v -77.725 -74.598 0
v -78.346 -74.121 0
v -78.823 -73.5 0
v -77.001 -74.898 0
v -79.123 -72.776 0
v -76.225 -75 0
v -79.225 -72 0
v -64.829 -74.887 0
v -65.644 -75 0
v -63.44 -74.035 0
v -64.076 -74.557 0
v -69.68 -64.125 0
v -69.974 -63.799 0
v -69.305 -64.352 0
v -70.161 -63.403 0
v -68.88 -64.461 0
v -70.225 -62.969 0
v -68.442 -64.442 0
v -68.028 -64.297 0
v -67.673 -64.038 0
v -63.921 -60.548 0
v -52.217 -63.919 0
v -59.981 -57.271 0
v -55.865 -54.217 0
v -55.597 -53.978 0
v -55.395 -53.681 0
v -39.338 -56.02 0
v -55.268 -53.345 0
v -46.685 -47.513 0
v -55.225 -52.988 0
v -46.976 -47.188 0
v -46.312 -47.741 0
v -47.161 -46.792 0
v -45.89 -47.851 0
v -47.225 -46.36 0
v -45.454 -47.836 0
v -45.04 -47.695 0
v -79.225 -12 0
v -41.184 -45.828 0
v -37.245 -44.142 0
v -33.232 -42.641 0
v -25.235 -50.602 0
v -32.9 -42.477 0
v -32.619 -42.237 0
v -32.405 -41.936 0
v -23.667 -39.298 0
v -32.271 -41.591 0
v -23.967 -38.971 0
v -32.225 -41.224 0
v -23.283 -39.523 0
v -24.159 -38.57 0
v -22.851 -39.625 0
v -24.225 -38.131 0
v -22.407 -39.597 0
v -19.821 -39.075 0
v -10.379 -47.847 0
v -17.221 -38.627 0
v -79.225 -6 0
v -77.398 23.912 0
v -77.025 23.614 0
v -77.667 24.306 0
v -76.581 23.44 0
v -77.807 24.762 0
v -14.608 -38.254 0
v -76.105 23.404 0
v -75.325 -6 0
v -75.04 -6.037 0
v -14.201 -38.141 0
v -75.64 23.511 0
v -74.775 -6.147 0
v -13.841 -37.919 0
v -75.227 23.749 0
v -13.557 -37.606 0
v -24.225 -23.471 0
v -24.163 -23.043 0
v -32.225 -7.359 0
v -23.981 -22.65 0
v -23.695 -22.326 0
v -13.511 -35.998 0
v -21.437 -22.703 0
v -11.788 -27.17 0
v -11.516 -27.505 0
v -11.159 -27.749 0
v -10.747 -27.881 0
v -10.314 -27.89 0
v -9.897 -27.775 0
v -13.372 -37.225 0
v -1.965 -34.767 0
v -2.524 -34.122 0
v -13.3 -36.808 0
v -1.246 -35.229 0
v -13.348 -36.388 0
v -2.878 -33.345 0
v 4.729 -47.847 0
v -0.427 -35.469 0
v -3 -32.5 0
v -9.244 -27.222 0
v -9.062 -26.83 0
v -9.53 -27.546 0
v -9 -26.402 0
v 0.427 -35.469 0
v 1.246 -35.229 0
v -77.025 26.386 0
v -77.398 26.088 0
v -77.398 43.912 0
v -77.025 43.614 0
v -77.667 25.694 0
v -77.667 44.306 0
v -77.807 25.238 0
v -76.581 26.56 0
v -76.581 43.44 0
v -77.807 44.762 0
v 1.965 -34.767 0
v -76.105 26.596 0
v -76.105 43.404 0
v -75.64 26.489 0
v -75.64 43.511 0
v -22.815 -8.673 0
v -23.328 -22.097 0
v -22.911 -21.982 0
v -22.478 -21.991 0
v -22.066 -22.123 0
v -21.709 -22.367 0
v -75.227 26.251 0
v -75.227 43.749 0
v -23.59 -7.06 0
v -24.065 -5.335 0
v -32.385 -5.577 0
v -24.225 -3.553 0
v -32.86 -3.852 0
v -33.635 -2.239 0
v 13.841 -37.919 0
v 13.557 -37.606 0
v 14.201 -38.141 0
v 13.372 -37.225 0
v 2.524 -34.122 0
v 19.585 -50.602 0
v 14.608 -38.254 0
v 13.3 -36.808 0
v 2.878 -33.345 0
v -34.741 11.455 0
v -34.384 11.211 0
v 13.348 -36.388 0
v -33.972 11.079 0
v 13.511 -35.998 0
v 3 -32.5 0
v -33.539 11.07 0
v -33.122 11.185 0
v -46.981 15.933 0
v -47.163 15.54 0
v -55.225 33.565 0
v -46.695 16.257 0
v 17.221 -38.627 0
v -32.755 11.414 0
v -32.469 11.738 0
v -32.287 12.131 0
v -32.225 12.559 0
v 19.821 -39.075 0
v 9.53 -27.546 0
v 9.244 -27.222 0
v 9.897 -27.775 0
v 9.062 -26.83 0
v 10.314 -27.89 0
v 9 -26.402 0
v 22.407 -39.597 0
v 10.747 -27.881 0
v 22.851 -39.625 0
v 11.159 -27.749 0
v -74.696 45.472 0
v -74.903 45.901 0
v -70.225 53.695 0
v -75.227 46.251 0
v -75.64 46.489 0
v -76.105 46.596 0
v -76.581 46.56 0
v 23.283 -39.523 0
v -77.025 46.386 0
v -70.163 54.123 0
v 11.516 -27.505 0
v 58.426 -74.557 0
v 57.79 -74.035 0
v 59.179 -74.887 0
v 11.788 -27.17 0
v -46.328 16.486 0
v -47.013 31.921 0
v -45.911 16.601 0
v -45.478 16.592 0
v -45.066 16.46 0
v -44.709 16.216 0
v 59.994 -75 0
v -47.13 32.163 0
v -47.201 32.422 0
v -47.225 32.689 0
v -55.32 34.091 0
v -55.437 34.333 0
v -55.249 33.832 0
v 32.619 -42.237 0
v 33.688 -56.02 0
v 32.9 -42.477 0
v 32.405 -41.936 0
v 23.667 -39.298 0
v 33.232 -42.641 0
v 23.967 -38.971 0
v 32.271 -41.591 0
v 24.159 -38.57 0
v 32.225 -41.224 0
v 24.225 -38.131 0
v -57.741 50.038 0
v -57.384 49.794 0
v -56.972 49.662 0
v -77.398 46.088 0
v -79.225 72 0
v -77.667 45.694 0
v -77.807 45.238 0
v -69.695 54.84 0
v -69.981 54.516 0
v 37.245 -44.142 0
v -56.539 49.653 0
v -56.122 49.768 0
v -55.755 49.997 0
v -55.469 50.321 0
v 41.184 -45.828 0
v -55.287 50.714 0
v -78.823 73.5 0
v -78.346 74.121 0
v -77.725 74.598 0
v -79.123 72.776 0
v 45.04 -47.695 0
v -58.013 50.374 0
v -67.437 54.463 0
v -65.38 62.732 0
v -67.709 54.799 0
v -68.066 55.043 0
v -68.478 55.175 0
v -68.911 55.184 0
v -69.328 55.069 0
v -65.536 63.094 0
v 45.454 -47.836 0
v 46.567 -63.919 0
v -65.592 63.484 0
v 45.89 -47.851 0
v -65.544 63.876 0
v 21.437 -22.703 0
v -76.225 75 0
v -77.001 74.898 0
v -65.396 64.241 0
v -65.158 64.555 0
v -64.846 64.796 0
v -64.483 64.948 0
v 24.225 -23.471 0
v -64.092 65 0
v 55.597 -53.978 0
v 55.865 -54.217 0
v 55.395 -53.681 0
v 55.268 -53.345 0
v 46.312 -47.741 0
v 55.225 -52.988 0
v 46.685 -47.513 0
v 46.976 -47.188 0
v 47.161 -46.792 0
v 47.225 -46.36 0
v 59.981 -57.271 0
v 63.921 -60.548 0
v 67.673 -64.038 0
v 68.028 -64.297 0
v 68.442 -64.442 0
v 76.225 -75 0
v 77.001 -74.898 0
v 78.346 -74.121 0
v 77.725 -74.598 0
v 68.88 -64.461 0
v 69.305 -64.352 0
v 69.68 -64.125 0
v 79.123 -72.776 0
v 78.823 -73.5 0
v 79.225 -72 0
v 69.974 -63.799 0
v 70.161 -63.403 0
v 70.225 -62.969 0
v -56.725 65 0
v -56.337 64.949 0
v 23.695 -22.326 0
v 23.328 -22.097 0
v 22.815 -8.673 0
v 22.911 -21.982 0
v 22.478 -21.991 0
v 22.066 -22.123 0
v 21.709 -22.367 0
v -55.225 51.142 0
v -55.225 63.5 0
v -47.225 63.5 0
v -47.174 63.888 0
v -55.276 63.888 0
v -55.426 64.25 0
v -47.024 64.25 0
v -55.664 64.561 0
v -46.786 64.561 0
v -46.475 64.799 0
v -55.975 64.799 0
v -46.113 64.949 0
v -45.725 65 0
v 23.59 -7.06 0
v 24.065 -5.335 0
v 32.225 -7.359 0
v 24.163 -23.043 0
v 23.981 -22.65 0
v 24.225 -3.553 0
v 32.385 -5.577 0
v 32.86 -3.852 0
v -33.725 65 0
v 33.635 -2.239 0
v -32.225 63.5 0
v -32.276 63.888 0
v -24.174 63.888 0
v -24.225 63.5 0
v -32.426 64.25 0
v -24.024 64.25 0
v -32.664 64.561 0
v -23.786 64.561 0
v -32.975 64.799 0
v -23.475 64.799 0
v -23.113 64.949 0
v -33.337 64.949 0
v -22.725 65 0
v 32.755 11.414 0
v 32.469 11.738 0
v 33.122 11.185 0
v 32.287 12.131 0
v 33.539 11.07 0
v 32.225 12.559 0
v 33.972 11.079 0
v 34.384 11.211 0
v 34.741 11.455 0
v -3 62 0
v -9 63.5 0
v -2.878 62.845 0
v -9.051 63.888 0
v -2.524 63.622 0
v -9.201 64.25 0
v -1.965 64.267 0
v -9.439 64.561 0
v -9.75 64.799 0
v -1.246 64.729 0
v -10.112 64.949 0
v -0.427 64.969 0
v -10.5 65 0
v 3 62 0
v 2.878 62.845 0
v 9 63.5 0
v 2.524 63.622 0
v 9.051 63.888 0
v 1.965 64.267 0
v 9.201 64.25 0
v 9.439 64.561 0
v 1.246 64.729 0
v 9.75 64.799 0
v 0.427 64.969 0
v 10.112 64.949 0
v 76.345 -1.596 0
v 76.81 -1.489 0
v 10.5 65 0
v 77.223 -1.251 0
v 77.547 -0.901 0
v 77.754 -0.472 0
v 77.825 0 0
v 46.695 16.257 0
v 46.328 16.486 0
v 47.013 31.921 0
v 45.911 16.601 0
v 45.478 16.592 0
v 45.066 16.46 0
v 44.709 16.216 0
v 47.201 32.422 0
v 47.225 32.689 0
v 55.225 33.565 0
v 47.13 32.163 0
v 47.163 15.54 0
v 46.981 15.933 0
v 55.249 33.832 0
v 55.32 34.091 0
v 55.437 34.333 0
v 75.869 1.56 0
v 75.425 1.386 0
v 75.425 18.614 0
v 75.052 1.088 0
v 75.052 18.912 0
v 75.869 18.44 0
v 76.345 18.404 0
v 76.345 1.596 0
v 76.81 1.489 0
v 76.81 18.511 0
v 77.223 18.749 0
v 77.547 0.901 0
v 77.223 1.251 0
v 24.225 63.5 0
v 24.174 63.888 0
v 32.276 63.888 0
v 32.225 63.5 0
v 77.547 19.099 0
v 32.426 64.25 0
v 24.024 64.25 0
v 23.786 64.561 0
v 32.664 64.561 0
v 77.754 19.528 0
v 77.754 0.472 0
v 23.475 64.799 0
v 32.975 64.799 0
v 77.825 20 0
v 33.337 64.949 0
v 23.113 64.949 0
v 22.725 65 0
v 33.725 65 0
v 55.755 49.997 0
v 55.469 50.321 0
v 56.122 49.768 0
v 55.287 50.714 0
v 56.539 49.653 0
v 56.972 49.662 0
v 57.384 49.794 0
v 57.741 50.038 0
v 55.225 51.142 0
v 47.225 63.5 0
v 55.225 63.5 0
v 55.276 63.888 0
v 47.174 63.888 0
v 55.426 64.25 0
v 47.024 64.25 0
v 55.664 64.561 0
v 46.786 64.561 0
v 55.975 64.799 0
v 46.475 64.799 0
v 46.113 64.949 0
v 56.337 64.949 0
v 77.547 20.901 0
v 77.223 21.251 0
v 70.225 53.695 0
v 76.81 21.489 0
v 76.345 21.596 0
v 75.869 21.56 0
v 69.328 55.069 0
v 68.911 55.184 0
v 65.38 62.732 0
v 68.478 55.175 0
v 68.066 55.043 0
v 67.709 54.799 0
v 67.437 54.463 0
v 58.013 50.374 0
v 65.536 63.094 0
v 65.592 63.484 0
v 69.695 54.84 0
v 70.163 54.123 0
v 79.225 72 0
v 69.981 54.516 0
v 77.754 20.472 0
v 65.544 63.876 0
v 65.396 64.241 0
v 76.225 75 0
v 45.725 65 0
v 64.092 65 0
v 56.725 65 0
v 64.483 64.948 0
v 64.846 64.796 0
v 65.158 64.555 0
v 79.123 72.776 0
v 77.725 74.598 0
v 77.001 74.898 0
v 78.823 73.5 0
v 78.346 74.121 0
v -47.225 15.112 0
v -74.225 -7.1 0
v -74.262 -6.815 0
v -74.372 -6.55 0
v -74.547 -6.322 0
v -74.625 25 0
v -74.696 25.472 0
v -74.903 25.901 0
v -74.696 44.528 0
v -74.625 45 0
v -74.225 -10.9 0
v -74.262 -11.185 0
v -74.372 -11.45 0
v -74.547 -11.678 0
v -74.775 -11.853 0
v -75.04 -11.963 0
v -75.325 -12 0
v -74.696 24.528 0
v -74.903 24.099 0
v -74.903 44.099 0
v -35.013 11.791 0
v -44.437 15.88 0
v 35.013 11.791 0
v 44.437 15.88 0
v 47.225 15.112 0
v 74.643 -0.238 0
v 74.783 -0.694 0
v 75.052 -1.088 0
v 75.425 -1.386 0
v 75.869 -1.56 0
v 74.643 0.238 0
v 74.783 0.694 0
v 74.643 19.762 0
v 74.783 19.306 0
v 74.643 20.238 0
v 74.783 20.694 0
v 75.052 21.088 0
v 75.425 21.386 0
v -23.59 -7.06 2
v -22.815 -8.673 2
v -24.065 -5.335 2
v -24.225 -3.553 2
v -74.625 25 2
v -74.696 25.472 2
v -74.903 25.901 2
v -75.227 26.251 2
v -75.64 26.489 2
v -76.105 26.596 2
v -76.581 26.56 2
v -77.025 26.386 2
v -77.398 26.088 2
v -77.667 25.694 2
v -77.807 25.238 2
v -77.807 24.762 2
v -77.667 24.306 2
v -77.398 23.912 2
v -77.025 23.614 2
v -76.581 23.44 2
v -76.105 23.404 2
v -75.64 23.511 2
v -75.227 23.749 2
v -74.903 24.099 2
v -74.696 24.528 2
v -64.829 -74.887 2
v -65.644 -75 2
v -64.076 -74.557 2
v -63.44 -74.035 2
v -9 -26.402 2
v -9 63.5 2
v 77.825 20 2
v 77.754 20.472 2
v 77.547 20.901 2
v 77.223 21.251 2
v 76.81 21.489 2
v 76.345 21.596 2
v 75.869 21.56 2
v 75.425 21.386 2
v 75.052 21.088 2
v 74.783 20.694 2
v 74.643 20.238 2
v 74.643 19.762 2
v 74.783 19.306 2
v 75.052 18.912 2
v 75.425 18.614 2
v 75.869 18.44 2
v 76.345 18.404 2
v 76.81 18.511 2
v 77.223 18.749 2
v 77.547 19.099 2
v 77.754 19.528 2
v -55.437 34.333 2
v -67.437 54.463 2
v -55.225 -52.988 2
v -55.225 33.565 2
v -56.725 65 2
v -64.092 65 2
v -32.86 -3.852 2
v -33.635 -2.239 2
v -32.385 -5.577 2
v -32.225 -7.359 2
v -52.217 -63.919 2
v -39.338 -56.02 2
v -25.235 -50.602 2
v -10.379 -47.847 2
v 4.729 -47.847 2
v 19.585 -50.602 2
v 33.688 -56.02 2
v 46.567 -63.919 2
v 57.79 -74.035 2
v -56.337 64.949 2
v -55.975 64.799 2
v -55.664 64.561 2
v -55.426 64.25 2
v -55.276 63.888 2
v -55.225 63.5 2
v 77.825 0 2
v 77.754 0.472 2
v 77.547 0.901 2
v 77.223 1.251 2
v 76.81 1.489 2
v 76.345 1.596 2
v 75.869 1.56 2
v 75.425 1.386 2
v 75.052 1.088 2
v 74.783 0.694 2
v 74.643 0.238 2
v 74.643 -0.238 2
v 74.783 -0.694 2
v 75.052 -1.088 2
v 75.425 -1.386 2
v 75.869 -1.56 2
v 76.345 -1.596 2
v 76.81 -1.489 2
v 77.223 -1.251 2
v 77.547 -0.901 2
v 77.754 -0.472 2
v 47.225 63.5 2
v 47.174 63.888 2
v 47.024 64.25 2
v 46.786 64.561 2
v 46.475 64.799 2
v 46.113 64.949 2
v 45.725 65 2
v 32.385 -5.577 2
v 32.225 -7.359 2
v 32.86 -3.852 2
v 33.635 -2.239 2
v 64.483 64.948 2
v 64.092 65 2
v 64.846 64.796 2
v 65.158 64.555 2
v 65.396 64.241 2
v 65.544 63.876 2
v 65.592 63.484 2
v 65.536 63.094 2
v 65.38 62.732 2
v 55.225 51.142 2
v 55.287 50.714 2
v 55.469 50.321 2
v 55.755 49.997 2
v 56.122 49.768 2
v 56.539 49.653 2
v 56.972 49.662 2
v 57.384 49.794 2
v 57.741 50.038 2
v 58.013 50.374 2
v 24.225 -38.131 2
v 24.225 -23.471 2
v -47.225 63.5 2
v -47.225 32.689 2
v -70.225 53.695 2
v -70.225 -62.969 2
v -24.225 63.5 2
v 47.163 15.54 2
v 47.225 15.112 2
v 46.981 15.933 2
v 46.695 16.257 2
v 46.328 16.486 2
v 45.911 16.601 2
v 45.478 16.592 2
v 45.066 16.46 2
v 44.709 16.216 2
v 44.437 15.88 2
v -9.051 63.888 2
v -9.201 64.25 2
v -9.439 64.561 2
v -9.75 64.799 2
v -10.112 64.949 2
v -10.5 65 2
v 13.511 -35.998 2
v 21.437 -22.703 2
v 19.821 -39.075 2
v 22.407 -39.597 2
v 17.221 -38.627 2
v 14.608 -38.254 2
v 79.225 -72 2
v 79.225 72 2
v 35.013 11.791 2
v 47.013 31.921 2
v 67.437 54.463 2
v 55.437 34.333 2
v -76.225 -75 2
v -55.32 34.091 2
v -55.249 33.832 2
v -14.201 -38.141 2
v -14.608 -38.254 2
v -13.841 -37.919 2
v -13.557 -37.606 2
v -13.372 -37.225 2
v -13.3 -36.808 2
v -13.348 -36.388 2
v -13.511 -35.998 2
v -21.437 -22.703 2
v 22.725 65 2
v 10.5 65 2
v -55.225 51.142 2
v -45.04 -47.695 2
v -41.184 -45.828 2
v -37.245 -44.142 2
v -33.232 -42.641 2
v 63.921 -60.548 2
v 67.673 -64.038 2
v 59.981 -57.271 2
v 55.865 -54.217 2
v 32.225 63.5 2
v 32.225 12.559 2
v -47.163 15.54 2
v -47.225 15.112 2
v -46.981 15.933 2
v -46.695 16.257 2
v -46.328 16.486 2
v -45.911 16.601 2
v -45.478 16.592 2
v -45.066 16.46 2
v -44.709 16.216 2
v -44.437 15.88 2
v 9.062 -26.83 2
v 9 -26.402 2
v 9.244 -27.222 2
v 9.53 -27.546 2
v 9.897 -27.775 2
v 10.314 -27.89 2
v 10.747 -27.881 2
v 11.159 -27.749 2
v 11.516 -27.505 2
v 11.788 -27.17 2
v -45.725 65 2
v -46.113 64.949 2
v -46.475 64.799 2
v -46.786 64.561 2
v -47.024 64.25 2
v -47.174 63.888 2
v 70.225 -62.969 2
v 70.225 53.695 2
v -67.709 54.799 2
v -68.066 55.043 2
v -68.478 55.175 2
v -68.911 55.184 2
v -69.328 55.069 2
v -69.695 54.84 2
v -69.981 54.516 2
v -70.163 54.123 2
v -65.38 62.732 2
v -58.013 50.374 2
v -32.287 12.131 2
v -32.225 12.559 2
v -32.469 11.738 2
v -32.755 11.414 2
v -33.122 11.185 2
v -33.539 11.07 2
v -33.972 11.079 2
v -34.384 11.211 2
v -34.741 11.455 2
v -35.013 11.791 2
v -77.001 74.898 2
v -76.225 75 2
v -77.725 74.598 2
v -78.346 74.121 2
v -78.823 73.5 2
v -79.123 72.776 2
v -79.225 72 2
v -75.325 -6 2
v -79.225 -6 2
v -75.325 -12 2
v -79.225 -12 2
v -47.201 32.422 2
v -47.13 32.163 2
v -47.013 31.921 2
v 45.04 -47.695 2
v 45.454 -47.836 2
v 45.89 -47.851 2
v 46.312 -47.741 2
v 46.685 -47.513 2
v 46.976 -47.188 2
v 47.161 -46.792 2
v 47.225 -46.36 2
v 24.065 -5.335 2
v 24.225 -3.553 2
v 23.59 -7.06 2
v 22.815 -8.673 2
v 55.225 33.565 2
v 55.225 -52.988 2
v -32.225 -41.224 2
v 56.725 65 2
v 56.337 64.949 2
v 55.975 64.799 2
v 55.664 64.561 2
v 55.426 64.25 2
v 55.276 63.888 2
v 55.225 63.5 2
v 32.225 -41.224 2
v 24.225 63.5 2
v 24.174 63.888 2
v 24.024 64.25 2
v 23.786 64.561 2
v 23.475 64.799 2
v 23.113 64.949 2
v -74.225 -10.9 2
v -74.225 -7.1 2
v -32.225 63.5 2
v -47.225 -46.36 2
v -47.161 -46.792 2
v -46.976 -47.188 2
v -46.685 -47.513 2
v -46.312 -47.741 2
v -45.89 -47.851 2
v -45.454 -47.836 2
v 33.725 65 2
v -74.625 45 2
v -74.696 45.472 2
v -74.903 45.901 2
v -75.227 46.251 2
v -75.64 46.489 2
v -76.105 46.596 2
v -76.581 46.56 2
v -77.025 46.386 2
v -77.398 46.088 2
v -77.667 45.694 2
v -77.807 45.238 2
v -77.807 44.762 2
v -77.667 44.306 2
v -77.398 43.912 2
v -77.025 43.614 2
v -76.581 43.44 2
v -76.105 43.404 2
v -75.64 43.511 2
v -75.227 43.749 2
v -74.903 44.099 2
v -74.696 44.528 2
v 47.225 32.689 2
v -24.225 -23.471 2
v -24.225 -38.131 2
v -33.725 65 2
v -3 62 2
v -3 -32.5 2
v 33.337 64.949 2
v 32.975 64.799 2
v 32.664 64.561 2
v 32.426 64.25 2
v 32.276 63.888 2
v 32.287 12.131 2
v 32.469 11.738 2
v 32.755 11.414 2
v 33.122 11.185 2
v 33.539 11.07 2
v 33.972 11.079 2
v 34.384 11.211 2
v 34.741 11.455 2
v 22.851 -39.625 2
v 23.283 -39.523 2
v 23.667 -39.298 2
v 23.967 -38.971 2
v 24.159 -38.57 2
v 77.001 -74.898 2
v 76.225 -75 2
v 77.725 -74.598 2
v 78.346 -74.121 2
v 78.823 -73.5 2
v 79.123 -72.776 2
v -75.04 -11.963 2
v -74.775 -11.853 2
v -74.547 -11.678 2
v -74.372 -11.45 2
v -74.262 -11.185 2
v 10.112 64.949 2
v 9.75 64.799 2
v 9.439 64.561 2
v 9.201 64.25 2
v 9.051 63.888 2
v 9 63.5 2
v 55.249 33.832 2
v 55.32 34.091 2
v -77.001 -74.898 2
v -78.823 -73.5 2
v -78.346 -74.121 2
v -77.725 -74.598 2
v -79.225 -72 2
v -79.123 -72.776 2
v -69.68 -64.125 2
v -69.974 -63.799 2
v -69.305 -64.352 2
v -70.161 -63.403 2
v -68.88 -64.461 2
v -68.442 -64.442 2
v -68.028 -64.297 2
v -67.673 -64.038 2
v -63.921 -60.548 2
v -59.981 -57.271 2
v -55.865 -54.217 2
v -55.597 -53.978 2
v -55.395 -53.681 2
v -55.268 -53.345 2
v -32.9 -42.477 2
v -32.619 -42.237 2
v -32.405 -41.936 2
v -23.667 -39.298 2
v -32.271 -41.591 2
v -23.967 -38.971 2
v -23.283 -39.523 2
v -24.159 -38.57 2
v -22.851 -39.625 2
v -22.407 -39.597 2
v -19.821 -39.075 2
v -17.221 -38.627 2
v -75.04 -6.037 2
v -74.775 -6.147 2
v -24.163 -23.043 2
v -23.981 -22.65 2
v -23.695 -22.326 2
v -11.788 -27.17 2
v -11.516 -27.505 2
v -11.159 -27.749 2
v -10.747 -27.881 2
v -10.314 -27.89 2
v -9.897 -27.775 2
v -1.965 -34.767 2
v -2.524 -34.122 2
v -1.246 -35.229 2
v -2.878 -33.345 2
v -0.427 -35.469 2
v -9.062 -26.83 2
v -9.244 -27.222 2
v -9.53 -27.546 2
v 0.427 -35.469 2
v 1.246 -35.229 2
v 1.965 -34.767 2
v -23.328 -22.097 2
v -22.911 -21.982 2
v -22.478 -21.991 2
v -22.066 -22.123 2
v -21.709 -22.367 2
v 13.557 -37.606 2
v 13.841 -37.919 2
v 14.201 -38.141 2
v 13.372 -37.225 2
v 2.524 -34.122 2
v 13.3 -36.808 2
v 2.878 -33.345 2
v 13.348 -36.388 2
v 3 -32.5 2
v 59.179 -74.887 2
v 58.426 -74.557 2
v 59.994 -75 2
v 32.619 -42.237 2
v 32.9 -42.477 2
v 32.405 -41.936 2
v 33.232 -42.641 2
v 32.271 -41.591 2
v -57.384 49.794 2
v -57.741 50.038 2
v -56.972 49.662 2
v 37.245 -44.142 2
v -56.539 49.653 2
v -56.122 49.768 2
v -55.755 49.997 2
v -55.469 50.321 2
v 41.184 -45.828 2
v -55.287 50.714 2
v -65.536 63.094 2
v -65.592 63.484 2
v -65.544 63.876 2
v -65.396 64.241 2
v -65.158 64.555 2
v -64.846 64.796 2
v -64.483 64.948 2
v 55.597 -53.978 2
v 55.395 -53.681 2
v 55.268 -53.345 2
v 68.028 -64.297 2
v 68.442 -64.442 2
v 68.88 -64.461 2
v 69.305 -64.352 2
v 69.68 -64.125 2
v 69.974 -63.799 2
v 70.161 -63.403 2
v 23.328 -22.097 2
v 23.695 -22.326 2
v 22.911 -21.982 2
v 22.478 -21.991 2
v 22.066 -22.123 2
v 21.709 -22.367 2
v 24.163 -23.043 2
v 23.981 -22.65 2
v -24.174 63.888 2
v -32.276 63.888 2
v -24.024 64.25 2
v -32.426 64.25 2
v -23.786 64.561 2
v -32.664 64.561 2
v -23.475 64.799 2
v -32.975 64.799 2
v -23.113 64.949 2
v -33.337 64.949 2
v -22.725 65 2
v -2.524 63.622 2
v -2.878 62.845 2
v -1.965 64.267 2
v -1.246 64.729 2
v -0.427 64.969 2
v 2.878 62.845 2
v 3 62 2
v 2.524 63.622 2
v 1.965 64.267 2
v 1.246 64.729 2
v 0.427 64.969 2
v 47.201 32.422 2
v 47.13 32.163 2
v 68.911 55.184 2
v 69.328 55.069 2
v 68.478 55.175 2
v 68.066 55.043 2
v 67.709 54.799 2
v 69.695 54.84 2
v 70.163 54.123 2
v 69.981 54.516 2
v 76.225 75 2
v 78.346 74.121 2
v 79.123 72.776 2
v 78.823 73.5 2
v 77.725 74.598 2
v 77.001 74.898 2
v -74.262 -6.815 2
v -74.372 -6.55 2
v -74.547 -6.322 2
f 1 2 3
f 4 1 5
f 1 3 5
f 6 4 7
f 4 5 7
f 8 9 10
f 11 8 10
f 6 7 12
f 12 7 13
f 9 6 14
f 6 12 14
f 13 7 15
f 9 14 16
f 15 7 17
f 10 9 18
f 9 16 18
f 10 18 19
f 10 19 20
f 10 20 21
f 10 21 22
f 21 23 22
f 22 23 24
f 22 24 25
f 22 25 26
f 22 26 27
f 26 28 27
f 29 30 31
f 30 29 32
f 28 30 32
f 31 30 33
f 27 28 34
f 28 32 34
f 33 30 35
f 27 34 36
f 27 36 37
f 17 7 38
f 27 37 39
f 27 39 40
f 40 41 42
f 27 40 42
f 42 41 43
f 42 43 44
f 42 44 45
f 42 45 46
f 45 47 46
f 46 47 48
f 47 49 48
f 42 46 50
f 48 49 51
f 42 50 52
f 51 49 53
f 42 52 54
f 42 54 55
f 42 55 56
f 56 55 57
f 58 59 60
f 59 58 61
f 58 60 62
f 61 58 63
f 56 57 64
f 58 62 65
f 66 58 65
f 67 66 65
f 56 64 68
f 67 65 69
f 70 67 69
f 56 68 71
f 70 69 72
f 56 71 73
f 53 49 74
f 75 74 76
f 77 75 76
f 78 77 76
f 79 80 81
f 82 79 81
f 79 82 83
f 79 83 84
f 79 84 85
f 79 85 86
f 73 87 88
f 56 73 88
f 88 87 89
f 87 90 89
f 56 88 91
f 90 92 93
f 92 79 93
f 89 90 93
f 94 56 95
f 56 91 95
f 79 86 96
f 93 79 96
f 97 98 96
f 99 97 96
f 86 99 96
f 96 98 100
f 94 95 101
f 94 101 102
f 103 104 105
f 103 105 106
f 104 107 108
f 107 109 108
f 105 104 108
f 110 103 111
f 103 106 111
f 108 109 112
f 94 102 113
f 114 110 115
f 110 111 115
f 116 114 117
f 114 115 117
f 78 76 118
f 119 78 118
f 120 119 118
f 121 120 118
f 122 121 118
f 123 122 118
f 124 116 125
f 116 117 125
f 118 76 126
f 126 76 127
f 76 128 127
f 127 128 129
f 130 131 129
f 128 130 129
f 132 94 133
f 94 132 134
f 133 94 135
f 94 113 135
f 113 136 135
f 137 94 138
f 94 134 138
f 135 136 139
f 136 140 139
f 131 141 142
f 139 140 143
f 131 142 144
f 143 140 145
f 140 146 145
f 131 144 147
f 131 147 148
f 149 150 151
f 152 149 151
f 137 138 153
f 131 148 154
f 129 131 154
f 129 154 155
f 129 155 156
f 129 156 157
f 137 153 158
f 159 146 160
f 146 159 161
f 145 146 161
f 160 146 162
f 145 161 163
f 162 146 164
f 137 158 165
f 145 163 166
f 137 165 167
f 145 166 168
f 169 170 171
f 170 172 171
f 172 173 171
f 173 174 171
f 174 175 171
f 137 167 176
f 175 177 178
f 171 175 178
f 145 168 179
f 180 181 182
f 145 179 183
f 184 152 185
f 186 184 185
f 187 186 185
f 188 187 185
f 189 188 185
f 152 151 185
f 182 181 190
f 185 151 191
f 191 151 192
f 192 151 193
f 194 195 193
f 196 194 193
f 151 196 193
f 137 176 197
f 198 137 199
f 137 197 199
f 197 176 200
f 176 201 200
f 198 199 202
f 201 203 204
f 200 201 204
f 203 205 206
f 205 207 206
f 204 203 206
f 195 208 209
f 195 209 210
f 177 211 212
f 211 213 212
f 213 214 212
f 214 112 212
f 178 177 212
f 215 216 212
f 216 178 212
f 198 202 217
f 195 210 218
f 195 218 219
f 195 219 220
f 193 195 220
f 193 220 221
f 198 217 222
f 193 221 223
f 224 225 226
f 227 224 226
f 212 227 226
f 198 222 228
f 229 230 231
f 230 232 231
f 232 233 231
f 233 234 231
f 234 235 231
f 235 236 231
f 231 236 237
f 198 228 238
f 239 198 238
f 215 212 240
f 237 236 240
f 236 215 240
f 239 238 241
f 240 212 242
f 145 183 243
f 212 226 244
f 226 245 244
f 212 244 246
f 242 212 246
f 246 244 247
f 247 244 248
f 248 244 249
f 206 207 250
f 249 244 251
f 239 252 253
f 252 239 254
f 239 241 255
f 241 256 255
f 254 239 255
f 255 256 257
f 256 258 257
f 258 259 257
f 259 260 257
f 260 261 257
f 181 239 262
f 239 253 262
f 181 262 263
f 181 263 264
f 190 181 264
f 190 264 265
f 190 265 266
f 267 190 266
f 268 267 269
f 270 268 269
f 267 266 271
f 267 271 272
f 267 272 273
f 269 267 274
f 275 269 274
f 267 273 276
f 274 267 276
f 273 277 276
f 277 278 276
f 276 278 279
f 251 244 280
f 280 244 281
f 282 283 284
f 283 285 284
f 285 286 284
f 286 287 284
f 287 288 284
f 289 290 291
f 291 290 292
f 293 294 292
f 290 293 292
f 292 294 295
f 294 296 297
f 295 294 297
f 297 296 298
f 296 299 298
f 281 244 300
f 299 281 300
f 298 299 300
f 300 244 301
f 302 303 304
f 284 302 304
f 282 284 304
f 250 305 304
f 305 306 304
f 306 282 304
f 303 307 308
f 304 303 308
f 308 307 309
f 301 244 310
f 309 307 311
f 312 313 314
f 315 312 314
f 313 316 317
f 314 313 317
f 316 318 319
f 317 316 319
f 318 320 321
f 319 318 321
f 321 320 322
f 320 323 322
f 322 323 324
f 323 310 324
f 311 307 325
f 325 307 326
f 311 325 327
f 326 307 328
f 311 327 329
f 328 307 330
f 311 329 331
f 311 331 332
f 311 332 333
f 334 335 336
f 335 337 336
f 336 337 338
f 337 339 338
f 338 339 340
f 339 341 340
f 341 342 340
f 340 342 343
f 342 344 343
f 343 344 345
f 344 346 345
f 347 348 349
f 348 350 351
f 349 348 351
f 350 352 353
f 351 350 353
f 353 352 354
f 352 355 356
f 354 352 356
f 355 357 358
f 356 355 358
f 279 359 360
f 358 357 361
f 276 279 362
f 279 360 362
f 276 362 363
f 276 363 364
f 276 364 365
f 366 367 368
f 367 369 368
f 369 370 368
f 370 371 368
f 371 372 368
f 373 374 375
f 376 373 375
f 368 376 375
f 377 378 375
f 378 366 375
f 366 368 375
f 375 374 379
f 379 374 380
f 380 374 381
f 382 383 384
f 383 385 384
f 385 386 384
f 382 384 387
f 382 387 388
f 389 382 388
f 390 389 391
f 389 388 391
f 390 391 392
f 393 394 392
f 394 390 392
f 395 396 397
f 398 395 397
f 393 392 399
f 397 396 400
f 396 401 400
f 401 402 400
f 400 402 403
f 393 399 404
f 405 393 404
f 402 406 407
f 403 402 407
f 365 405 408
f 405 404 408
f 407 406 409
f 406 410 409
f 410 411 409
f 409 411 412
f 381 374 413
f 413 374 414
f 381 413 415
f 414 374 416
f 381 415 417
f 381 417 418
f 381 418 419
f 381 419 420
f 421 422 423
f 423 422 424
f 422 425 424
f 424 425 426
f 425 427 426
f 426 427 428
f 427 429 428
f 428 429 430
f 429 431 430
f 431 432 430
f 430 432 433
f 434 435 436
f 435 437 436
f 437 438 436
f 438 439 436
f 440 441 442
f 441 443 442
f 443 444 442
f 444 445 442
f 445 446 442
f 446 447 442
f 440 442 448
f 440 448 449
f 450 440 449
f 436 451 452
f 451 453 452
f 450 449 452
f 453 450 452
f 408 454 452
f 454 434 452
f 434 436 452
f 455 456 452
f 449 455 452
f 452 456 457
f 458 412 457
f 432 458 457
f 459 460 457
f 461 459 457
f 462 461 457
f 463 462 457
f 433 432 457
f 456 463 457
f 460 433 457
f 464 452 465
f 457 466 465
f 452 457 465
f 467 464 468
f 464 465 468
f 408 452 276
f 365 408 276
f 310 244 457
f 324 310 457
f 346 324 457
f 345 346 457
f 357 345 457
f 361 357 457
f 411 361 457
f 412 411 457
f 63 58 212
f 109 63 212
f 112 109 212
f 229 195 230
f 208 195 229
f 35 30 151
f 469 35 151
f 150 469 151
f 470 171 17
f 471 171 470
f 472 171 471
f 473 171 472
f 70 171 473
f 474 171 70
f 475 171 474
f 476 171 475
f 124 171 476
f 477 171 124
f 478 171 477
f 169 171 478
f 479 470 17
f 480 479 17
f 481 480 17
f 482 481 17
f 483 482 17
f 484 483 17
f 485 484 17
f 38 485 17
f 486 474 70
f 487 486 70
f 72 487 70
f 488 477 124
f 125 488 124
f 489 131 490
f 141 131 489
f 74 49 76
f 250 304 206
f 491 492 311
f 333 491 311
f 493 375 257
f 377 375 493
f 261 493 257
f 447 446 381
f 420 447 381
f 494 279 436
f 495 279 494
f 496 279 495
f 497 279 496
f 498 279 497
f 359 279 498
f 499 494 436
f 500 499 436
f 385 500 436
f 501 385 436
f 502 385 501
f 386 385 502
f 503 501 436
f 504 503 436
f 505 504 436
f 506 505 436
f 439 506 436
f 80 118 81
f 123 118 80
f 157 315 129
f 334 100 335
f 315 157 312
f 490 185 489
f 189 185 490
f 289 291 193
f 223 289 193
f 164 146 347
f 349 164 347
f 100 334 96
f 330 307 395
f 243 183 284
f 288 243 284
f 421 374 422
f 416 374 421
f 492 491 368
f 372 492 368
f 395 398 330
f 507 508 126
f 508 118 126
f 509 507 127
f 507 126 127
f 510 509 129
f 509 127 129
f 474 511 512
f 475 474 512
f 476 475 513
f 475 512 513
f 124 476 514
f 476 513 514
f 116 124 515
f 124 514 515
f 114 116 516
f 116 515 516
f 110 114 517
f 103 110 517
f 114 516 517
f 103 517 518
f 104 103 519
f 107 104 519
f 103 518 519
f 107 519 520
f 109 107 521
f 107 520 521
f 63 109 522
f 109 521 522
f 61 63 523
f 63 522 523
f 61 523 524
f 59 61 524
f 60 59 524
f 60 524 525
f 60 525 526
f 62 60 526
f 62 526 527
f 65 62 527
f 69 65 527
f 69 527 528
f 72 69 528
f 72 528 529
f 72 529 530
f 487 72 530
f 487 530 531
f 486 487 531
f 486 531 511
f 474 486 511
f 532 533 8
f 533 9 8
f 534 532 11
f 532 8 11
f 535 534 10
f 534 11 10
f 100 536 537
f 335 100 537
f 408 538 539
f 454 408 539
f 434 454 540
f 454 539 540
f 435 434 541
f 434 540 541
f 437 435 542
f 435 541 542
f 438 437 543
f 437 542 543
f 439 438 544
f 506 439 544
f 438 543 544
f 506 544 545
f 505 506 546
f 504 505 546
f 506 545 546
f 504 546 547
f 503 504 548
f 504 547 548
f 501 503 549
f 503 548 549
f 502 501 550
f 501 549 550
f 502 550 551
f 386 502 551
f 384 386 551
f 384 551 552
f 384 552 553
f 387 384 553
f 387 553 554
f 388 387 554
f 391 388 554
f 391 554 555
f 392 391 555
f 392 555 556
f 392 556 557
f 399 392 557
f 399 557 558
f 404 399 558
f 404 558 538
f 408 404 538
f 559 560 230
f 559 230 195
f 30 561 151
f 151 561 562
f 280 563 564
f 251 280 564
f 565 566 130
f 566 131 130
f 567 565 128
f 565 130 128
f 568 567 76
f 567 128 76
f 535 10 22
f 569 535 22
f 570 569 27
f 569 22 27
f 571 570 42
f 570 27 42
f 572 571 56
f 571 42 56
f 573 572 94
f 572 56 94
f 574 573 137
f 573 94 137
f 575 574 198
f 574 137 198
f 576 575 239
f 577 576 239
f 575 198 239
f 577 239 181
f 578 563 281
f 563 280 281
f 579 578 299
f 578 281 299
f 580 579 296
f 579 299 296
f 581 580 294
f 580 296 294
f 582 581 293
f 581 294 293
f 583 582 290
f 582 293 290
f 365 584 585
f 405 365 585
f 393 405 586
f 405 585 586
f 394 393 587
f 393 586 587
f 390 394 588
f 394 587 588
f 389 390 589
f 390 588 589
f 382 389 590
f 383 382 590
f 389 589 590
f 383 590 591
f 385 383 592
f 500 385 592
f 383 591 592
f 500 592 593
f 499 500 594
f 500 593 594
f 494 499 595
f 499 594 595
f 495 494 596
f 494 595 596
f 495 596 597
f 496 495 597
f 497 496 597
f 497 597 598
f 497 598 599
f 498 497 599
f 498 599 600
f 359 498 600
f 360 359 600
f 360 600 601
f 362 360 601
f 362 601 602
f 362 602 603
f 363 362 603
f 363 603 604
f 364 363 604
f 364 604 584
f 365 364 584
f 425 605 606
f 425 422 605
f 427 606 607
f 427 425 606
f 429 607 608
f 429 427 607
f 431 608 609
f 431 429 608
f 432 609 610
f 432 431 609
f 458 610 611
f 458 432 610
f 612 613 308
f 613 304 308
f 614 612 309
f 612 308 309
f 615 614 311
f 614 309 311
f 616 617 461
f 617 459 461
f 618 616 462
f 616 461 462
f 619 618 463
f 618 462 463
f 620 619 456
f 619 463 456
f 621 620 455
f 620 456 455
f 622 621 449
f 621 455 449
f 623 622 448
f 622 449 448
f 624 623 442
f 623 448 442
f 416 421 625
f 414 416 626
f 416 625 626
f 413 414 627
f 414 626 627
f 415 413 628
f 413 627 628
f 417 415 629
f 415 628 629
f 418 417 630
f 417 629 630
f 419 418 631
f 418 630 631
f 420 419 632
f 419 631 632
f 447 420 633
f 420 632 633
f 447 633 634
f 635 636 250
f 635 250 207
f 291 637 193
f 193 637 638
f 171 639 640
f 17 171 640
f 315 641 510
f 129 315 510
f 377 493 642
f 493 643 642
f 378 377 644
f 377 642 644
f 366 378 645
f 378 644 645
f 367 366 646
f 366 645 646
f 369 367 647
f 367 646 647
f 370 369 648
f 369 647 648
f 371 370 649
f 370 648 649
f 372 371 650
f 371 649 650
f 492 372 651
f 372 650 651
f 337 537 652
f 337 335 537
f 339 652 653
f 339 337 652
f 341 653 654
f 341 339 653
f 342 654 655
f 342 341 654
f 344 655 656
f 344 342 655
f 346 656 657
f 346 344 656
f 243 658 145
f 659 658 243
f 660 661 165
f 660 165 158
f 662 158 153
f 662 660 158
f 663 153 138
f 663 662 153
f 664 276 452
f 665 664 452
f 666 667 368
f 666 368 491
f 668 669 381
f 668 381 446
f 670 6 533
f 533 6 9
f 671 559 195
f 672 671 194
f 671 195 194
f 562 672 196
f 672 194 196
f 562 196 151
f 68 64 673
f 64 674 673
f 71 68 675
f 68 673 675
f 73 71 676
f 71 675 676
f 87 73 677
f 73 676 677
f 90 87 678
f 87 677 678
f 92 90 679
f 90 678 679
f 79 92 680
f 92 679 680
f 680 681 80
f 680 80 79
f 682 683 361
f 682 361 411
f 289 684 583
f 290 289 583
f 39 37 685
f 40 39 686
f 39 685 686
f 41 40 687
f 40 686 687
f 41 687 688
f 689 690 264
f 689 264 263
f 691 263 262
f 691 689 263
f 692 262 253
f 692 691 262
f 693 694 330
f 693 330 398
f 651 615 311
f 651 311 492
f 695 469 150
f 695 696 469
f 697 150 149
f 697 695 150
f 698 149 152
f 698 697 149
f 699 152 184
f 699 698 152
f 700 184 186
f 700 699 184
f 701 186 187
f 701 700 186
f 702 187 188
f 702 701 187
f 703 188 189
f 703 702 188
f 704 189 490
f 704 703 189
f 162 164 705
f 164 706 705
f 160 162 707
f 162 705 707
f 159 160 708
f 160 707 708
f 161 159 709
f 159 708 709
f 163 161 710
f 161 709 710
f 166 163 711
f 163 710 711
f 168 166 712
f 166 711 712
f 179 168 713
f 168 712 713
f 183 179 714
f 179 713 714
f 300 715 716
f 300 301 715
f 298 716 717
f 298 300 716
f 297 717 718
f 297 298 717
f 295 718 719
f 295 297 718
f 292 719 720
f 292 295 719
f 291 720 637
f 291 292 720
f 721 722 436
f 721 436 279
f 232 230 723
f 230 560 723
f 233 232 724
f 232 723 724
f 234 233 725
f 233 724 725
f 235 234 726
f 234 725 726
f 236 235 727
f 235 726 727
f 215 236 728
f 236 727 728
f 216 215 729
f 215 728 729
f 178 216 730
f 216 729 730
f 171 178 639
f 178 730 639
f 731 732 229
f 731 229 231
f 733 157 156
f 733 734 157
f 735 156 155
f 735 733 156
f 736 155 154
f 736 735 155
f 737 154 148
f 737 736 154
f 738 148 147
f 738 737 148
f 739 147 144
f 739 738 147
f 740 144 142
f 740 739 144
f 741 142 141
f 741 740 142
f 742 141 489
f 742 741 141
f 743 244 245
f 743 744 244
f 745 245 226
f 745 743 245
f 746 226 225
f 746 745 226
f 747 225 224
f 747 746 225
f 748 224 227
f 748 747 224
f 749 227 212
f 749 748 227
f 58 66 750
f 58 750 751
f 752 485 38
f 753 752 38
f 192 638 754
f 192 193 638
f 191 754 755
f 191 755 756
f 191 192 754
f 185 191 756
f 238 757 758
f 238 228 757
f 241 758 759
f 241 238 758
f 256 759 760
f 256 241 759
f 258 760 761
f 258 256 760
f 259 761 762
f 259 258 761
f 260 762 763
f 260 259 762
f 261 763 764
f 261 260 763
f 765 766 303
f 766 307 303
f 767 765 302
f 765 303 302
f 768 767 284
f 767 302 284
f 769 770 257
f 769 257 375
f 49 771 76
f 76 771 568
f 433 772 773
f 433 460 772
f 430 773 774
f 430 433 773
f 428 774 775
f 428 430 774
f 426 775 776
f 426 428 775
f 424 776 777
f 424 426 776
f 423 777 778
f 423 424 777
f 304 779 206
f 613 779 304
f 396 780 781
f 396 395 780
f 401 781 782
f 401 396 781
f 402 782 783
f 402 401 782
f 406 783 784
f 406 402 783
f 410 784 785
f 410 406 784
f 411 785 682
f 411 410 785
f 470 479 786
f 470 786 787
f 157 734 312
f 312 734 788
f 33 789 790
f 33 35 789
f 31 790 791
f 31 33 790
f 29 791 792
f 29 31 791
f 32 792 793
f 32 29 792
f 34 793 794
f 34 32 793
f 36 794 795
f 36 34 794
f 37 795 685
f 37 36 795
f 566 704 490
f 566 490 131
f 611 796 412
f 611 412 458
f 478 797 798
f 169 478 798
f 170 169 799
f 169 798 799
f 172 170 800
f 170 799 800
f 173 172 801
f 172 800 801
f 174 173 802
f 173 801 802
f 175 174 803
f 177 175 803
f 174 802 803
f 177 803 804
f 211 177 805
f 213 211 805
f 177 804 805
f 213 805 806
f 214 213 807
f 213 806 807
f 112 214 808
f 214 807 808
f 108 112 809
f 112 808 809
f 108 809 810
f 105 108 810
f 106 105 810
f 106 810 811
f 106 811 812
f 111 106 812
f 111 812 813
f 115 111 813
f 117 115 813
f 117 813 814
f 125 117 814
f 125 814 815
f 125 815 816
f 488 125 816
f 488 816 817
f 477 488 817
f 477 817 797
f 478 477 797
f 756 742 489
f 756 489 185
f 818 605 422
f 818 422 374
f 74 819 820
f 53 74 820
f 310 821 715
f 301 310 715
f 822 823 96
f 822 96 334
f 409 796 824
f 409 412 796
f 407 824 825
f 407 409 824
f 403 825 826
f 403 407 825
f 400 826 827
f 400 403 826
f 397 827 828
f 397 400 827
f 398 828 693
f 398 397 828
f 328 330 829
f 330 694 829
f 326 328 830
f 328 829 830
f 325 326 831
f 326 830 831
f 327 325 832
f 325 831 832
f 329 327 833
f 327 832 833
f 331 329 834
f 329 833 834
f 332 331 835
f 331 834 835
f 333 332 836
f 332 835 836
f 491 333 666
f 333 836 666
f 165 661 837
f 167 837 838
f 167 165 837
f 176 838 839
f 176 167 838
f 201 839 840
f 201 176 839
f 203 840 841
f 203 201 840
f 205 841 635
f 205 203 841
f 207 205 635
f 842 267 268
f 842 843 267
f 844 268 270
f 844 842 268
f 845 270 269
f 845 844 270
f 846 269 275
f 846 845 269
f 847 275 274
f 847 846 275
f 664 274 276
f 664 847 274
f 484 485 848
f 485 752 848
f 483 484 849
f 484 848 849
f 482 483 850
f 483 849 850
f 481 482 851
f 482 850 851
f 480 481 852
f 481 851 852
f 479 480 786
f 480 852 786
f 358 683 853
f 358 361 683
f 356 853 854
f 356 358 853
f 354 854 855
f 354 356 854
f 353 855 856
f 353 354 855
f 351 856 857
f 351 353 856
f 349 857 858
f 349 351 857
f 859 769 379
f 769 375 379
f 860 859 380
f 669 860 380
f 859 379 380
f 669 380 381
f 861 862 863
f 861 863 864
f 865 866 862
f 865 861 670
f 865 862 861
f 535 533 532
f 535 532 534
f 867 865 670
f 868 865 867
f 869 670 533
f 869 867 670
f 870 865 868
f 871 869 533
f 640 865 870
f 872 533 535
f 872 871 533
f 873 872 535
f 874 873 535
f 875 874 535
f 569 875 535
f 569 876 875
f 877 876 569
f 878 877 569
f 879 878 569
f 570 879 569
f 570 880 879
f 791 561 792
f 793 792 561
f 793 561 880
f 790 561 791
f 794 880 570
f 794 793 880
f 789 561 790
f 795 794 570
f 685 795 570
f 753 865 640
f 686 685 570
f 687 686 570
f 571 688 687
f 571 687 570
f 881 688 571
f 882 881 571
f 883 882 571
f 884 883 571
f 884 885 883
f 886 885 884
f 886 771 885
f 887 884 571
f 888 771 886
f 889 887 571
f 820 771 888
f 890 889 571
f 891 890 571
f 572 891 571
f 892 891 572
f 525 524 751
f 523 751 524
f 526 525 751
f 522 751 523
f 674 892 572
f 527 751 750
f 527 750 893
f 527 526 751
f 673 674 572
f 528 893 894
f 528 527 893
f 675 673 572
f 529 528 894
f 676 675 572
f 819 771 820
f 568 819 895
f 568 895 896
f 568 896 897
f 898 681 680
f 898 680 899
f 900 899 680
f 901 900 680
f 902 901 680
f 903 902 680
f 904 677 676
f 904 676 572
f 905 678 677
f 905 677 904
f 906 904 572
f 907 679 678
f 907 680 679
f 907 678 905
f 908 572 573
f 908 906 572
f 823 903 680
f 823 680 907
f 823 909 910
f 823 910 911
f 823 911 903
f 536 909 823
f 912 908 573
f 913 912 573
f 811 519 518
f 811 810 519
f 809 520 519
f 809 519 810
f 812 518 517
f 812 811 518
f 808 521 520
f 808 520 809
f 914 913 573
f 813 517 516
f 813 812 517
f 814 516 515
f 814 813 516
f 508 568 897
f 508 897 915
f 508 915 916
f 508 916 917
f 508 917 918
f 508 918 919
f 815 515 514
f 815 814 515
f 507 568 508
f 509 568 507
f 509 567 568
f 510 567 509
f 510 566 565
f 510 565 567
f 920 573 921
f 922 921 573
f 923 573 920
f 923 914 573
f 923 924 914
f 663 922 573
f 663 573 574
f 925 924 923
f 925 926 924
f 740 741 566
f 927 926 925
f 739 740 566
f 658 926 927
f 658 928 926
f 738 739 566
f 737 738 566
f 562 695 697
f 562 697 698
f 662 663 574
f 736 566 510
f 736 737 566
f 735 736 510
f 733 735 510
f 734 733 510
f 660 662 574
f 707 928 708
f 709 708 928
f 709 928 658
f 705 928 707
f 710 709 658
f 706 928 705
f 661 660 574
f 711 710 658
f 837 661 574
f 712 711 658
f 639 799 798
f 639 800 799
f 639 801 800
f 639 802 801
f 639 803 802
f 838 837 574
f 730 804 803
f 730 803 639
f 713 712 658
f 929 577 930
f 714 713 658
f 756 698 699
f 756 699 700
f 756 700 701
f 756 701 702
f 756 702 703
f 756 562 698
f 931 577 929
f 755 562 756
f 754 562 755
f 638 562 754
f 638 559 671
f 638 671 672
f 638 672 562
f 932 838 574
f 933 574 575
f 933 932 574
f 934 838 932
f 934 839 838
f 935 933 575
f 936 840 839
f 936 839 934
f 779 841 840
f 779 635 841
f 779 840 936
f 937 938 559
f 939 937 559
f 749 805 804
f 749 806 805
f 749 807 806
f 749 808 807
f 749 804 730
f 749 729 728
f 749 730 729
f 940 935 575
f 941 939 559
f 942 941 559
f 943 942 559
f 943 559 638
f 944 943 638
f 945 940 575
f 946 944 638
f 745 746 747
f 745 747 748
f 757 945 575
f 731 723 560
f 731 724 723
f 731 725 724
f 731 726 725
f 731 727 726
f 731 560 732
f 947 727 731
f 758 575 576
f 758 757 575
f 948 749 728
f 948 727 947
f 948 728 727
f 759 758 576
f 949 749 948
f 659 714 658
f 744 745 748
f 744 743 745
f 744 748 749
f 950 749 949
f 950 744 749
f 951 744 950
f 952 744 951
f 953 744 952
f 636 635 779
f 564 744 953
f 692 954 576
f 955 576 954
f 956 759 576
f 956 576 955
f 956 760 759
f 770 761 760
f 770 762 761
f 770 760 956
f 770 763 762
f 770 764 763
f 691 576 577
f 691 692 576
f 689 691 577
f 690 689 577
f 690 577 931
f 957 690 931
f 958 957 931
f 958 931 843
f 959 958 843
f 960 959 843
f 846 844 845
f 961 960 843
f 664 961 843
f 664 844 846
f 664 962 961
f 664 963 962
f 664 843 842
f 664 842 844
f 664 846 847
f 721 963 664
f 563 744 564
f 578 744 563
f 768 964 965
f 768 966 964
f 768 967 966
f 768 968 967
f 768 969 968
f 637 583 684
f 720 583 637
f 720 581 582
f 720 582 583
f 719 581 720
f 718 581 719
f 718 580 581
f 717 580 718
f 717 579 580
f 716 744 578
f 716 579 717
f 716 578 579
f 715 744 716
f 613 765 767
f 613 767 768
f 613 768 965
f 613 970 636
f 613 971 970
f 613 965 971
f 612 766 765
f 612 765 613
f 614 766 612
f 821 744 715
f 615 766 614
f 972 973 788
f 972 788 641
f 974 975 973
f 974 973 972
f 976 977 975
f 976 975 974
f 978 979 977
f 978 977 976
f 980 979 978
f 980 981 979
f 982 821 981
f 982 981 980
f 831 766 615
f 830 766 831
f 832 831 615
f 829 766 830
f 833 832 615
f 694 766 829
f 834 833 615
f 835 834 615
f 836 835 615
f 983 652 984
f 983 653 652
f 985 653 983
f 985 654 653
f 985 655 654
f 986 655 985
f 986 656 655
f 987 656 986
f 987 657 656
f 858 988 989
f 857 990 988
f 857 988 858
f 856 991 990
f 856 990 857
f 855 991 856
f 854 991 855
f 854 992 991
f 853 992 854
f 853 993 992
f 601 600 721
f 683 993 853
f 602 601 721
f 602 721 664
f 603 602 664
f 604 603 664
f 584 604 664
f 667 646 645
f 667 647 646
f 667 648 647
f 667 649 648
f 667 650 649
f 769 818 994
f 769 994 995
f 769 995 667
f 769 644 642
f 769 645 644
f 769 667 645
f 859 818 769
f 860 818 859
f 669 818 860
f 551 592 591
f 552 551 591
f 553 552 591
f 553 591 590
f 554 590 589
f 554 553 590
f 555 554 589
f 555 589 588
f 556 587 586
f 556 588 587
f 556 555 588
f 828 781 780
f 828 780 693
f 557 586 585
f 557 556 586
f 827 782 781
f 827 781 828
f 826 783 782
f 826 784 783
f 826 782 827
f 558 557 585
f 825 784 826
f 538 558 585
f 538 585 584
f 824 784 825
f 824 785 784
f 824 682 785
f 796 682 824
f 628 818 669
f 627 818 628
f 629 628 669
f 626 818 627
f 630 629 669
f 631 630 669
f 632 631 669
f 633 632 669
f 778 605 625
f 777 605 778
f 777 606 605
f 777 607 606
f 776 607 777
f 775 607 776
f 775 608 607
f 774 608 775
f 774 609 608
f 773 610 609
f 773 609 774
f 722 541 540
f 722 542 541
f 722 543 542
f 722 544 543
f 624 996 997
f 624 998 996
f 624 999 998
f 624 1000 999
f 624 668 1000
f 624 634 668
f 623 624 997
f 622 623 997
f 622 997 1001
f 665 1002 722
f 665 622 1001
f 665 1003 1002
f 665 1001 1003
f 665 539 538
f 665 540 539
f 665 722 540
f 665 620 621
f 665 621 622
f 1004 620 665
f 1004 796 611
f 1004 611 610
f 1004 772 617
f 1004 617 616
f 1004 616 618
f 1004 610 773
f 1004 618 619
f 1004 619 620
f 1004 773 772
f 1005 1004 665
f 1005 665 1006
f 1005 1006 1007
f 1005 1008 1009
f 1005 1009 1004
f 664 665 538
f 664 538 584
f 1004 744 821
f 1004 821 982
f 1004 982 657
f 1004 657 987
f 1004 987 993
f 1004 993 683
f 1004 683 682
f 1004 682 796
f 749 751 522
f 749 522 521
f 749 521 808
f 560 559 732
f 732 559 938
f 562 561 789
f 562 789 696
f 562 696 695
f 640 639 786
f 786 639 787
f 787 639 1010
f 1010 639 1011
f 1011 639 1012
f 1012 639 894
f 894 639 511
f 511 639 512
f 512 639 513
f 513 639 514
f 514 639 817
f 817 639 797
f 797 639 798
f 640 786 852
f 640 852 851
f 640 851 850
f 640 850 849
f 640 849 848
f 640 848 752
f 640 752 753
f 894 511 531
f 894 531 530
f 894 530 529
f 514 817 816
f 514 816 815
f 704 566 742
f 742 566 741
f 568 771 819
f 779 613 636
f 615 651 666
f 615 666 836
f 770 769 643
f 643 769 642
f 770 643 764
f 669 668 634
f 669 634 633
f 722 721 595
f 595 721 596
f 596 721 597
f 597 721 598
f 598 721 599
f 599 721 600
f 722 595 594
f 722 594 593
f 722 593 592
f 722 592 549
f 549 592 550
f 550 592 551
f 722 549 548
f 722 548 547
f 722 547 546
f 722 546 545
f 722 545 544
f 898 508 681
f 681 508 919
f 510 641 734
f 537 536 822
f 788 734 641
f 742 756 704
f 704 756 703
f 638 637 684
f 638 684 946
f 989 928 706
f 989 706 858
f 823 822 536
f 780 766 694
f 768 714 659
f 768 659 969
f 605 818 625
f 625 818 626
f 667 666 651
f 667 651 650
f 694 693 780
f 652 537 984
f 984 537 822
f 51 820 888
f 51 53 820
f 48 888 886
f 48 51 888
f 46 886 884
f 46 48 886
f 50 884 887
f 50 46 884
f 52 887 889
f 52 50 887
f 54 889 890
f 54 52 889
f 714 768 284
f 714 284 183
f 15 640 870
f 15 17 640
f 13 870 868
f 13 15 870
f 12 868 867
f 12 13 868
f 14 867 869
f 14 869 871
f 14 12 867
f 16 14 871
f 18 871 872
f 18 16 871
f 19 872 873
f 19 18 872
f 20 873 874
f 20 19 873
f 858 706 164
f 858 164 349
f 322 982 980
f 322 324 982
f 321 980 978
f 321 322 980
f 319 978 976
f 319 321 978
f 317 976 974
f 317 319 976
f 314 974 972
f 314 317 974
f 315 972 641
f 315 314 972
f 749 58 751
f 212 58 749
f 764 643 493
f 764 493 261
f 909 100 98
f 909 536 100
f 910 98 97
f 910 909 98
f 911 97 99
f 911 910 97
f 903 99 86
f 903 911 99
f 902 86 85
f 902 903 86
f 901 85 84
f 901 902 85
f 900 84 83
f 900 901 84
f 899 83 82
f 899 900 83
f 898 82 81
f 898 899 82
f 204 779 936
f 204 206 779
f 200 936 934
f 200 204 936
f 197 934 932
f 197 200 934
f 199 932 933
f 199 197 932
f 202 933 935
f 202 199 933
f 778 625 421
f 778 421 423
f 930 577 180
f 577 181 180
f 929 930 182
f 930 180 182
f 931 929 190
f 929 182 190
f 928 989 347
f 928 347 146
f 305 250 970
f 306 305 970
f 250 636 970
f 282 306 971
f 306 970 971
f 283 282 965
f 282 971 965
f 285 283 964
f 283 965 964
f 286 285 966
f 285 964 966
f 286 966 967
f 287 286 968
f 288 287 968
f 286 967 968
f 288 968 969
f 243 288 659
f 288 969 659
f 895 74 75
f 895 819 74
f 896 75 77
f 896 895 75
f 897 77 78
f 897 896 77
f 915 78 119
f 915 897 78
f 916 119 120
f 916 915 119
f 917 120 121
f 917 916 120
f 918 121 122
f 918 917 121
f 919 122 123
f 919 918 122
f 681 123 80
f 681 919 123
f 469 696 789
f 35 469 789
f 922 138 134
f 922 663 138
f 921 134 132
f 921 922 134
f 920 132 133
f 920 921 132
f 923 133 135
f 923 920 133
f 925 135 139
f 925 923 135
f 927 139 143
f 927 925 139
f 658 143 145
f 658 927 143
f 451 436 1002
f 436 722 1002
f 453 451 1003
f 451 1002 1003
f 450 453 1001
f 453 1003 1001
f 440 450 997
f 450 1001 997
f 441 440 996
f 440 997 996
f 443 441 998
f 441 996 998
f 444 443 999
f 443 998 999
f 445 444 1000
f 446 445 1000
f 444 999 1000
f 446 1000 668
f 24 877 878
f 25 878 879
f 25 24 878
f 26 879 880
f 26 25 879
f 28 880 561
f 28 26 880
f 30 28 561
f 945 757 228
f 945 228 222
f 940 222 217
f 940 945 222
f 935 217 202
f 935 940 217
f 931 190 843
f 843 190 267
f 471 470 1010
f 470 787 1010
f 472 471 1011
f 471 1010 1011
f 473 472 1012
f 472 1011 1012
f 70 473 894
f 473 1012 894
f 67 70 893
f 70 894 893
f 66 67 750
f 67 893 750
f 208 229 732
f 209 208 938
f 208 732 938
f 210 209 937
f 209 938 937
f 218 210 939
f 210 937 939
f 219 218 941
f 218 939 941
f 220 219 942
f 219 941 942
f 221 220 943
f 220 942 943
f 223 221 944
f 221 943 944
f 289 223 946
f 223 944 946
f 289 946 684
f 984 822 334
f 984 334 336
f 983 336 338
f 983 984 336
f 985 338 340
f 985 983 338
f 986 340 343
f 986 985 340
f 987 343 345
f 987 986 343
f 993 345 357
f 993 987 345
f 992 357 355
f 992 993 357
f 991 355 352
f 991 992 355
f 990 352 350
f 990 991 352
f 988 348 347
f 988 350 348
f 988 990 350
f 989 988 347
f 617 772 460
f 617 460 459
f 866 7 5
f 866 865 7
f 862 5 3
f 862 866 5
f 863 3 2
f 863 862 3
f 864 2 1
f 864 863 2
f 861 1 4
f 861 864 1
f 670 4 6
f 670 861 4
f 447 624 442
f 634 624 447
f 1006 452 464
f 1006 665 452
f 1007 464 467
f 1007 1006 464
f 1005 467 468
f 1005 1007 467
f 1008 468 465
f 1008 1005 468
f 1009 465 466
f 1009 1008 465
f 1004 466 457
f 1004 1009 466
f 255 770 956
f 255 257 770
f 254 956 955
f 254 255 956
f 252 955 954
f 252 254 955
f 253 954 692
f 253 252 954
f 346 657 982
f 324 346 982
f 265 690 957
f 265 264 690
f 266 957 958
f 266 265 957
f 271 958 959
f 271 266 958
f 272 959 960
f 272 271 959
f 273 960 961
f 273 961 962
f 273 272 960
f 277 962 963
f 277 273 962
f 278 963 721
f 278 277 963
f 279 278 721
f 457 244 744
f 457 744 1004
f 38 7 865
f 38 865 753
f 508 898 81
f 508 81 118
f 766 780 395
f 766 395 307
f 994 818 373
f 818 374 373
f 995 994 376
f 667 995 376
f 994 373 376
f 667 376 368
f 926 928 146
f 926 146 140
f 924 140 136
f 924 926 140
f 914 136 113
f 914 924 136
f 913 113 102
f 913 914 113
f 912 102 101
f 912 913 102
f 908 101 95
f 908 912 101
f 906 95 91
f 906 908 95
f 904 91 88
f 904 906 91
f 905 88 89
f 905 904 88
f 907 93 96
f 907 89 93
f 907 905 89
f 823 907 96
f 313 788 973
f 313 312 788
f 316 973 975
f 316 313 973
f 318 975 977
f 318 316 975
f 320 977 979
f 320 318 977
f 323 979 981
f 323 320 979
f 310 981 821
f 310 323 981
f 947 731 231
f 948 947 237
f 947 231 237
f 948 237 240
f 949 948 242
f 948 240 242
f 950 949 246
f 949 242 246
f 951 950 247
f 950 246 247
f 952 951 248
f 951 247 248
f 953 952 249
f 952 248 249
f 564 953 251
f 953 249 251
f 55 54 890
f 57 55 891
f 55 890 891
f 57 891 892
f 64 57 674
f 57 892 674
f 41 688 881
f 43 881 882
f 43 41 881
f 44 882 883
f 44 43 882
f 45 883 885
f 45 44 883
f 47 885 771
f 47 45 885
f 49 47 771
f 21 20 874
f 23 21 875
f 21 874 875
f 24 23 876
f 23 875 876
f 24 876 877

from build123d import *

# Parameters (mm, degrees)
SKETCH_1_W          = 158.45
SKETCH_1_H          = 150
EXTRUDE_1_DEPTH     = 2
SKETCH_2_R          = 82.5
CUT_EXTRUDE_1_DEPTH = 10
SKETCH_4_W          = 10
SKETCH_4_H          = 6
CUT_EXTRUDE_2_DEPTH = 10
FILLET_1_R          = 1.1
SKETCH_5_R          = 1.6
CUT_EXTRUDE_3_DEPTH = 10
CUT_EXTRUDE_4_DEPTH = 10
EXTRUDE_2_DEPTH     = 2
FILLET_2_R          = 1.5
FILLET_3_R          = 10
FILLET_4_R          = 3
CUT_EXTRUDE_5_DEPTH = 10


with BuildPart() as part:
    # 草图1 → 凸台-拉伸1 (new body)
    with BuildSketch(Plane.XY):
        Rectangle(SKETCH_1_W, SKETCH_1_H)
    extrude(amount=EXTRUDE_1_DEPTH)

    # 草图2 → 切除-拉伸1 (cut)
    with BuildSketch(Plane(origin=(0, 0, 0), x_dir=(-1, 0, 0), z_dir=(0, 0, -1))):
        with Locations((2.825, -130)):
            Circle(SKETCH_2_R)
    extrude(amount=-CUT_EXTRUDE_1_DEPTH, mode=Mode.SUBTRACT)

    # 草图4 → 切除-拉伸2 (cut)
    with BuildSketch(Plane(origin=(0, 0, 0), x_dir=(-1, 0, 0), z_dir=(0, 0, -1))):
        with Locations((79.225, -9)):
            Rectangle(SKETCH_4_W, SKETCH_4_H)
    extrude(amount=-CUT_EXTRUDE_2_DEPTH, mode=Mode.SUBTRACT)

    # 圆角1
    fillet_1_edges = [part.edges().sort_by_distance(p)[0] for p in [
        (-74.225, -12, 1),
        (-74.225, -6, 1),
    ]]
    fillet(fillet_1_edges, radius=FILLET_1_R)

    # 草图5 → 切除-拉伸3 (cut)
    with BuildSketch(Plane.XY.offset(2)):
        with Locations((76.225, 20)):
            Circle(SKETCH_5_R)
        with Locations((76.225, 0)):
            Circle(SKETCH_5_R)
        with Locations((-76.225, 45)):
            Circle(SKETCH_5_R)
        with Locations((-76.225, 25)):
            Circle(SKETCH_5_R)
    extrude(amount=-CUT_EXTRUDE_3_DEPTH, mode=Mode.SUBTRACT)

    # 草图6 → 切除-拉伸4 (cut)
    with BuildSketch(Plane.XY.offset(2)):
        with BuildLine():
            Line((-55.225, 65), (-70.225, 65))
            Line((-70.225, 65), (-70.225, -66.647888749))
            ThreePointArc((-70.225, -66.647888749), (-63.069899561, -59.80881767), (-55.225, -53.773429829))
            Line((-55.225, -53.773429829), (-55.225, 65))
        make_face()
        with BuildLine():
            Line((-32.225, 65), (-47.225, 65))
            Line((-47.225, 65), (-47.225, -48.852664862))
            ThreePointArc((-47.225, -48.852664862), (-39.870317713, -45.242142337), (-32.225, -42.296579314))
            Line((-32.225, -42.296579314), (-32.225, 65))
        make_face()
        with BuildLine():
            Line((-9, 65), (-24.225, 65))
            Line((-24.225, 65), (-24.225, -40.009500501))
            ThreePointArc((-24.225, -40.009500501), (-16.660508355, -38.540562496), (-9, -37.706341632))
            Line((-9, -37.706341632), (-9, 65))
        make_face()
    cut_extrude_4 = extrude(amount=-CUT_EXTRUDE_4_DEPTH, mode=Mode.SUBTRACT)

    # 镜向1: 切除-拉伸4 across plane
    add(cut_extrude_4.mirror(Plane(origin=(0, 0, 0), x_dir=(0, 0, 1), z_dir=(1, 0, 0))), mode=Mode.SUBTRACT)

    # 草图7 → 凸台-拉伸2 (add)
    with BuildSketch(Plane.XY.offset(2)):
        Polygon((-72.801882642, 63.463876356), (-11.576882642, -39.242465276), (-6.423117358, -36.170217988), (-67.648117358, 66.536123644), align=None)
        Polygon((67.648117358, 66.536123644), (6.423117358, -36.170217988), (11.576882642, -39.242465276), (72.801882642, 63.463876356), align=None)
    extrude(amount=-EXTRUDE_2_DEPTH)

    # 圆角2
    fillet_2_edges = [part.edges().sort_by_distance(p)[0] for p in [
        (-32.225, -42.296579314, 1),
        (-47.225, -48.852664862, 1),
        (-47.225, 65, 1),
        (-32.225, 65, 1),
        (-24.225, -40.009500501, 1),
        (-24.225, 65, 1),
        (-9, 65, 1),
        (70.225, -66.647888749, 1),
        (55.225, -53.773429829, 1),
        (55.225, 65, 1),
        (47.225, -48.852664862, 1),
        (32.225, -42.296579314, 1),
        (32.225, 65, 1),
        (47.225, 65, 1),
        (24.225, -40.009500501, 1),
        (9, 65, 1),
        (24.225, 65, 1),
        (-55.225, 45.696059365, 1),
        (-55.225, 33.978252617, 1),
        (-12.32407353, -37.989035425, 1),
        (-24.225, -18.024958336, 1),
        (-47.225, 20.558069145, 1),
        (-9, -31.847438258, 1),
        (-32.225, 7.113031883, 1),
        (-47.225, 32.275875893, 1),
        (-70.225, 59.141096626, 1),
        (-66.732407884, 65, 1),
        (70.225, 59.141096626, 1),
        (66.732407884, 65, 1),
        (32.225, 7.113031883, 1),
        (47.225, 32.275875893, 1),
        (55.225, 45.696059365, 1),
        (9, -31.847438258, 1),
        (24.225, -18.024958336, 1),
        (47.225, 20.558069145, 1),
        (55.225, 33.978252617, 1),
        (12.32407353, -37.989035425, 1),
        (-55.225, -53.773429829, 1),
        (-70.225, -66.647888749, 1),
        (-55.225, 65, 1),
    ]]
    fillet(fillet_2_edges, radius=FILLET_2_R)

    # 圆角3
    fillet_3_edges = [part.edges().sort_by_distance(p)[0] for p in [
        (-32.225, -4.604774864, 1),
        (-24.225, -6.307151588, 1),
        (24.225, -6.307151588, 1),
        (32.225, -4.604774864, 1),
    ]]
    fillet(fillet_3_edges, radius=FILLET_3_R)

    # 圆角4
    fillet_4_edges = [part.edges().sort_by_distance(p)[0] for p in [
        (58.666869381, -75, 1),
        (-64.316869381, -75, 1),
        (79.225, -75, 1),
        (-79.225, -75, 1),
        (-79.225, 75, 1),
        (79.225, 75, 1),
    ]]
    fillet(fillet_4_edges, radius=FILLET_4_R)

    # 草图10 → 切除-拉伸5 (cut)
    with BuildSketch(Plane.XY.offset(2)):
        with BuildLine():
            Line((3, 62), (3, -32.5))
            ThreePointArc((3, -32.5), (0, -35.5), (-3, -32.5))
            Line((-3, -32.5), (-3, 62))
            ThreePointArc((-3, 62), (0, 65), (3, 62))
        make_face()
    extrude(amount=-CUT_EXTRUDE_5_DEPTH, mode=Mode.SUBTRACT)


solid = part.part
